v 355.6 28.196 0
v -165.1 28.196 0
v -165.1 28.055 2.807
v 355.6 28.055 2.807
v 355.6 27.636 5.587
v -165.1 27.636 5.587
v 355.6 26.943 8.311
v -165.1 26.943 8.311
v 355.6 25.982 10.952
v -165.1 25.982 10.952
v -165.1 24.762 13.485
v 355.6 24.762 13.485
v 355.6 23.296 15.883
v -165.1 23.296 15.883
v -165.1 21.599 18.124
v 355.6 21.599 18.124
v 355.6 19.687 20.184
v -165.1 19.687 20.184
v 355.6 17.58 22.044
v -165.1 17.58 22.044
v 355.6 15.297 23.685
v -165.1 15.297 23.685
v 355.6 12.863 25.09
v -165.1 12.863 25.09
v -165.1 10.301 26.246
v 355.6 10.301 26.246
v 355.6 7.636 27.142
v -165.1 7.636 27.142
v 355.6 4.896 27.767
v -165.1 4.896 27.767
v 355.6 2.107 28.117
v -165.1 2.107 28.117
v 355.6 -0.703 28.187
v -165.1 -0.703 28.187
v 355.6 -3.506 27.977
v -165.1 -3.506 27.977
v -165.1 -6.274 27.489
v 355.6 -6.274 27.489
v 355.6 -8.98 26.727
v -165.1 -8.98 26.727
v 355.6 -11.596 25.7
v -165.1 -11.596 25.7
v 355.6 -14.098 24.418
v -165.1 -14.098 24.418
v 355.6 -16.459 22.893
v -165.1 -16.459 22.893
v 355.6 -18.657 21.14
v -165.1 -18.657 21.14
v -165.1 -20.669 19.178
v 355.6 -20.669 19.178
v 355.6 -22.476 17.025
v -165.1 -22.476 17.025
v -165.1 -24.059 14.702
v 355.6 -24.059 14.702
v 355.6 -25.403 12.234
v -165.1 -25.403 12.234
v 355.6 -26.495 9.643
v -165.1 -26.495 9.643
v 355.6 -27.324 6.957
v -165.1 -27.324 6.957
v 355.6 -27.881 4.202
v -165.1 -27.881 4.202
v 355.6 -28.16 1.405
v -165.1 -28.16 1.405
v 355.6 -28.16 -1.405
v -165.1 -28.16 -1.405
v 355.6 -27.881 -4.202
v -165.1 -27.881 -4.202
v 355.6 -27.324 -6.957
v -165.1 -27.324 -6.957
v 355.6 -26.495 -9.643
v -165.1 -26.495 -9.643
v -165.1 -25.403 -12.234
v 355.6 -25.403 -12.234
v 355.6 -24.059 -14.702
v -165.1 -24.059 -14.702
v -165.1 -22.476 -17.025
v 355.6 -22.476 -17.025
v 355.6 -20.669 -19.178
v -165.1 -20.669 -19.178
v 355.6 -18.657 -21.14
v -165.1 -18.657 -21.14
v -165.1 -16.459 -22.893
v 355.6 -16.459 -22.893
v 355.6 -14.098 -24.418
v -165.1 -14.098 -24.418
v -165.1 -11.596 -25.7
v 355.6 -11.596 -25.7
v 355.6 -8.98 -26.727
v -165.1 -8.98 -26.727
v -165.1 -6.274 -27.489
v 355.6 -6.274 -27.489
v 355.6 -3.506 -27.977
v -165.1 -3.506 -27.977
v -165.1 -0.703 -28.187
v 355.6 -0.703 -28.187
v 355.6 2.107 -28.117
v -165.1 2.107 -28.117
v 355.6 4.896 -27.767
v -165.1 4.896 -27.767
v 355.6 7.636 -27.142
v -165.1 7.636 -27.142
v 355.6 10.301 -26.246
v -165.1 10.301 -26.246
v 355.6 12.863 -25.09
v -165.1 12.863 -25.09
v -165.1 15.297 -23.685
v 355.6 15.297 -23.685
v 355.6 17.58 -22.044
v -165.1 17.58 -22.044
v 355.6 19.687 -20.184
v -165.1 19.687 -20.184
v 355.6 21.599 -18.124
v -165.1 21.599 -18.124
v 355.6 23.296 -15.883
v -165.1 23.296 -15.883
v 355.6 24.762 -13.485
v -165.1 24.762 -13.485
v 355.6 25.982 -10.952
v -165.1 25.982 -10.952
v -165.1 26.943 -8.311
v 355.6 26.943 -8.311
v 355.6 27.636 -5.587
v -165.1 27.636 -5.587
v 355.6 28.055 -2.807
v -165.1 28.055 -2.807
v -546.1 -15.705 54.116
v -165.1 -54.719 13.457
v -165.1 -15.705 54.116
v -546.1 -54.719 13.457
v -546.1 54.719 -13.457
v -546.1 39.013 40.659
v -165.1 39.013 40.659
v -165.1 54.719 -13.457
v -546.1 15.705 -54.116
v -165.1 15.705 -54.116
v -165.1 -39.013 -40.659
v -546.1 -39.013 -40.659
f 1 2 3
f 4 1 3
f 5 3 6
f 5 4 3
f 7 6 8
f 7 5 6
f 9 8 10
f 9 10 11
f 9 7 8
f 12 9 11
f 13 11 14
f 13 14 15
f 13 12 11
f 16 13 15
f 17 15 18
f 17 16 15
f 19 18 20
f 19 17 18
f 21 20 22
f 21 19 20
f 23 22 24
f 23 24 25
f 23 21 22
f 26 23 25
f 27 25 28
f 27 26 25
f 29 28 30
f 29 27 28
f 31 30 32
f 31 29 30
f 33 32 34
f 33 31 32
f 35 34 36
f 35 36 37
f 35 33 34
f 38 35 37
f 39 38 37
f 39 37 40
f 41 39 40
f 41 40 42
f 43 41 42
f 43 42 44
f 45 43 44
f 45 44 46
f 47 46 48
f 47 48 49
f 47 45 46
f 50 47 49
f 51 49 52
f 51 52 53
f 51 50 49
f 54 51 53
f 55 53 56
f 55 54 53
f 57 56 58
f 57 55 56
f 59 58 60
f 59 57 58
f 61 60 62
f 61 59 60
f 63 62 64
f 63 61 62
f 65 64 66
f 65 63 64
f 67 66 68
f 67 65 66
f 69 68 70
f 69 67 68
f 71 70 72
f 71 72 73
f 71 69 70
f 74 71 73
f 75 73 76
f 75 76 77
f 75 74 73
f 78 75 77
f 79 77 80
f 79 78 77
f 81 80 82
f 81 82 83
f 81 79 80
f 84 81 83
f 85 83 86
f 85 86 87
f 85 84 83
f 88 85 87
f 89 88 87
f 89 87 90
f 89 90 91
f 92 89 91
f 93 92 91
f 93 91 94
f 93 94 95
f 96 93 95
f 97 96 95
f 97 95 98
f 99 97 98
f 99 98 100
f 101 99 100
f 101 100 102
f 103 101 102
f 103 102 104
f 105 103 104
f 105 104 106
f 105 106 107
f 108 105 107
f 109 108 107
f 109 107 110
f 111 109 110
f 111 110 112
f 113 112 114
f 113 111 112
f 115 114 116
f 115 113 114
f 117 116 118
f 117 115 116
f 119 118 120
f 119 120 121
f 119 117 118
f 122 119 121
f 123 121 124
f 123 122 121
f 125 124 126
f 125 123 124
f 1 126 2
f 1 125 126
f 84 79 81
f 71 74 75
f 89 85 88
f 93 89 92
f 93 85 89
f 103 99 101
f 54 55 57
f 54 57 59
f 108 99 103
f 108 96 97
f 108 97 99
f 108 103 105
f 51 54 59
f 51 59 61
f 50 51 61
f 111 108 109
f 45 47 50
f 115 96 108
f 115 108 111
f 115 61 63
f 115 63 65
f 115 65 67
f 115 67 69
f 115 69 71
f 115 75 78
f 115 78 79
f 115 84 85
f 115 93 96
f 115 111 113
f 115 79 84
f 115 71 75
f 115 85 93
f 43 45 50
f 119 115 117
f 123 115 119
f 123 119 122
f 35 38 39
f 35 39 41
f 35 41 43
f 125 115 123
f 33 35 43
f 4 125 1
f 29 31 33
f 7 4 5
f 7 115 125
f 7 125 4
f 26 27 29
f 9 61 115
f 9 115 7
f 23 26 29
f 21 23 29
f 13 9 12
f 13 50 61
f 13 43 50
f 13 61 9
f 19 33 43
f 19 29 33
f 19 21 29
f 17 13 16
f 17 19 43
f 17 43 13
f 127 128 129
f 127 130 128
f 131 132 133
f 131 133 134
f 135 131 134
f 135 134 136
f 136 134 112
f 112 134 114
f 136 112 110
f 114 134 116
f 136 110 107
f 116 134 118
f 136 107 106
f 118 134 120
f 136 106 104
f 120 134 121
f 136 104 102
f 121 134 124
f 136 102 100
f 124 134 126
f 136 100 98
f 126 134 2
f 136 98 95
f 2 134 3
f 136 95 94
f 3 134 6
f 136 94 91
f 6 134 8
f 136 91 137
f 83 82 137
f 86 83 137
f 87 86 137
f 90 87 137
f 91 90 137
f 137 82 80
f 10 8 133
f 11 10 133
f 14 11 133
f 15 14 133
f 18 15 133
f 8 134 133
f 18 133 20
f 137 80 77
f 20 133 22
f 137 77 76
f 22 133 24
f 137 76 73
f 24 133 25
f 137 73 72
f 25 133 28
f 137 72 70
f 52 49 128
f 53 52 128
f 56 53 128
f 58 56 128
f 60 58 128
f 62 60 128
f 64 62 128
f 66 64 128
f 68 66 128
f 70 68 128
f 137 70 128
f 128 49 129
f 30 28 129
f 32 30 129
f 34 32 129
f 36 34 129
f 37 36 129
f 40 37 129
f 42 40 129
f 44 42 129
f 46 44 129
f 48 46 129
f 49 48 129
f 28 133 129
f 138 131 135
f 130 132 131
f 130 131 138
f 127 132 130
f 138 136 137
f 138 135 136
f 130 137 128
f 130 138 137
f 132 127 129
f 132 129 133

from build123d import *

# Parameters (mm, degrees)
F0_R     = 28.195536
F1_DEPTH = 355.6
F3_DEPTH = 190.5


with BuildPart() as f1:
    # F0 (on Right) → F1 (new body, symmetric)
    with BuildSketch(Plane.YZ):
        Circle(F0_R)
    extrude(amount=F1_DEPTH, both=True)

    # F2 (on face) → F3 (join, symmetric)
    with BuildSketch(Plane(origin=(-355.6, 0, 0), x_dir=(0, -1, 0), z_dir=(-1, 0, 0))):
        Polygon((54.718636, 13.456735), (15.705444, 54.116097), (-39.013193, 40.659361), (-54.718636, -13.456735), (-15.705444, -54.116097), (39.013193, -40.659361), align=None)
    extrude(amount=F3_DEPTH, both=True)


solid = f1.part
